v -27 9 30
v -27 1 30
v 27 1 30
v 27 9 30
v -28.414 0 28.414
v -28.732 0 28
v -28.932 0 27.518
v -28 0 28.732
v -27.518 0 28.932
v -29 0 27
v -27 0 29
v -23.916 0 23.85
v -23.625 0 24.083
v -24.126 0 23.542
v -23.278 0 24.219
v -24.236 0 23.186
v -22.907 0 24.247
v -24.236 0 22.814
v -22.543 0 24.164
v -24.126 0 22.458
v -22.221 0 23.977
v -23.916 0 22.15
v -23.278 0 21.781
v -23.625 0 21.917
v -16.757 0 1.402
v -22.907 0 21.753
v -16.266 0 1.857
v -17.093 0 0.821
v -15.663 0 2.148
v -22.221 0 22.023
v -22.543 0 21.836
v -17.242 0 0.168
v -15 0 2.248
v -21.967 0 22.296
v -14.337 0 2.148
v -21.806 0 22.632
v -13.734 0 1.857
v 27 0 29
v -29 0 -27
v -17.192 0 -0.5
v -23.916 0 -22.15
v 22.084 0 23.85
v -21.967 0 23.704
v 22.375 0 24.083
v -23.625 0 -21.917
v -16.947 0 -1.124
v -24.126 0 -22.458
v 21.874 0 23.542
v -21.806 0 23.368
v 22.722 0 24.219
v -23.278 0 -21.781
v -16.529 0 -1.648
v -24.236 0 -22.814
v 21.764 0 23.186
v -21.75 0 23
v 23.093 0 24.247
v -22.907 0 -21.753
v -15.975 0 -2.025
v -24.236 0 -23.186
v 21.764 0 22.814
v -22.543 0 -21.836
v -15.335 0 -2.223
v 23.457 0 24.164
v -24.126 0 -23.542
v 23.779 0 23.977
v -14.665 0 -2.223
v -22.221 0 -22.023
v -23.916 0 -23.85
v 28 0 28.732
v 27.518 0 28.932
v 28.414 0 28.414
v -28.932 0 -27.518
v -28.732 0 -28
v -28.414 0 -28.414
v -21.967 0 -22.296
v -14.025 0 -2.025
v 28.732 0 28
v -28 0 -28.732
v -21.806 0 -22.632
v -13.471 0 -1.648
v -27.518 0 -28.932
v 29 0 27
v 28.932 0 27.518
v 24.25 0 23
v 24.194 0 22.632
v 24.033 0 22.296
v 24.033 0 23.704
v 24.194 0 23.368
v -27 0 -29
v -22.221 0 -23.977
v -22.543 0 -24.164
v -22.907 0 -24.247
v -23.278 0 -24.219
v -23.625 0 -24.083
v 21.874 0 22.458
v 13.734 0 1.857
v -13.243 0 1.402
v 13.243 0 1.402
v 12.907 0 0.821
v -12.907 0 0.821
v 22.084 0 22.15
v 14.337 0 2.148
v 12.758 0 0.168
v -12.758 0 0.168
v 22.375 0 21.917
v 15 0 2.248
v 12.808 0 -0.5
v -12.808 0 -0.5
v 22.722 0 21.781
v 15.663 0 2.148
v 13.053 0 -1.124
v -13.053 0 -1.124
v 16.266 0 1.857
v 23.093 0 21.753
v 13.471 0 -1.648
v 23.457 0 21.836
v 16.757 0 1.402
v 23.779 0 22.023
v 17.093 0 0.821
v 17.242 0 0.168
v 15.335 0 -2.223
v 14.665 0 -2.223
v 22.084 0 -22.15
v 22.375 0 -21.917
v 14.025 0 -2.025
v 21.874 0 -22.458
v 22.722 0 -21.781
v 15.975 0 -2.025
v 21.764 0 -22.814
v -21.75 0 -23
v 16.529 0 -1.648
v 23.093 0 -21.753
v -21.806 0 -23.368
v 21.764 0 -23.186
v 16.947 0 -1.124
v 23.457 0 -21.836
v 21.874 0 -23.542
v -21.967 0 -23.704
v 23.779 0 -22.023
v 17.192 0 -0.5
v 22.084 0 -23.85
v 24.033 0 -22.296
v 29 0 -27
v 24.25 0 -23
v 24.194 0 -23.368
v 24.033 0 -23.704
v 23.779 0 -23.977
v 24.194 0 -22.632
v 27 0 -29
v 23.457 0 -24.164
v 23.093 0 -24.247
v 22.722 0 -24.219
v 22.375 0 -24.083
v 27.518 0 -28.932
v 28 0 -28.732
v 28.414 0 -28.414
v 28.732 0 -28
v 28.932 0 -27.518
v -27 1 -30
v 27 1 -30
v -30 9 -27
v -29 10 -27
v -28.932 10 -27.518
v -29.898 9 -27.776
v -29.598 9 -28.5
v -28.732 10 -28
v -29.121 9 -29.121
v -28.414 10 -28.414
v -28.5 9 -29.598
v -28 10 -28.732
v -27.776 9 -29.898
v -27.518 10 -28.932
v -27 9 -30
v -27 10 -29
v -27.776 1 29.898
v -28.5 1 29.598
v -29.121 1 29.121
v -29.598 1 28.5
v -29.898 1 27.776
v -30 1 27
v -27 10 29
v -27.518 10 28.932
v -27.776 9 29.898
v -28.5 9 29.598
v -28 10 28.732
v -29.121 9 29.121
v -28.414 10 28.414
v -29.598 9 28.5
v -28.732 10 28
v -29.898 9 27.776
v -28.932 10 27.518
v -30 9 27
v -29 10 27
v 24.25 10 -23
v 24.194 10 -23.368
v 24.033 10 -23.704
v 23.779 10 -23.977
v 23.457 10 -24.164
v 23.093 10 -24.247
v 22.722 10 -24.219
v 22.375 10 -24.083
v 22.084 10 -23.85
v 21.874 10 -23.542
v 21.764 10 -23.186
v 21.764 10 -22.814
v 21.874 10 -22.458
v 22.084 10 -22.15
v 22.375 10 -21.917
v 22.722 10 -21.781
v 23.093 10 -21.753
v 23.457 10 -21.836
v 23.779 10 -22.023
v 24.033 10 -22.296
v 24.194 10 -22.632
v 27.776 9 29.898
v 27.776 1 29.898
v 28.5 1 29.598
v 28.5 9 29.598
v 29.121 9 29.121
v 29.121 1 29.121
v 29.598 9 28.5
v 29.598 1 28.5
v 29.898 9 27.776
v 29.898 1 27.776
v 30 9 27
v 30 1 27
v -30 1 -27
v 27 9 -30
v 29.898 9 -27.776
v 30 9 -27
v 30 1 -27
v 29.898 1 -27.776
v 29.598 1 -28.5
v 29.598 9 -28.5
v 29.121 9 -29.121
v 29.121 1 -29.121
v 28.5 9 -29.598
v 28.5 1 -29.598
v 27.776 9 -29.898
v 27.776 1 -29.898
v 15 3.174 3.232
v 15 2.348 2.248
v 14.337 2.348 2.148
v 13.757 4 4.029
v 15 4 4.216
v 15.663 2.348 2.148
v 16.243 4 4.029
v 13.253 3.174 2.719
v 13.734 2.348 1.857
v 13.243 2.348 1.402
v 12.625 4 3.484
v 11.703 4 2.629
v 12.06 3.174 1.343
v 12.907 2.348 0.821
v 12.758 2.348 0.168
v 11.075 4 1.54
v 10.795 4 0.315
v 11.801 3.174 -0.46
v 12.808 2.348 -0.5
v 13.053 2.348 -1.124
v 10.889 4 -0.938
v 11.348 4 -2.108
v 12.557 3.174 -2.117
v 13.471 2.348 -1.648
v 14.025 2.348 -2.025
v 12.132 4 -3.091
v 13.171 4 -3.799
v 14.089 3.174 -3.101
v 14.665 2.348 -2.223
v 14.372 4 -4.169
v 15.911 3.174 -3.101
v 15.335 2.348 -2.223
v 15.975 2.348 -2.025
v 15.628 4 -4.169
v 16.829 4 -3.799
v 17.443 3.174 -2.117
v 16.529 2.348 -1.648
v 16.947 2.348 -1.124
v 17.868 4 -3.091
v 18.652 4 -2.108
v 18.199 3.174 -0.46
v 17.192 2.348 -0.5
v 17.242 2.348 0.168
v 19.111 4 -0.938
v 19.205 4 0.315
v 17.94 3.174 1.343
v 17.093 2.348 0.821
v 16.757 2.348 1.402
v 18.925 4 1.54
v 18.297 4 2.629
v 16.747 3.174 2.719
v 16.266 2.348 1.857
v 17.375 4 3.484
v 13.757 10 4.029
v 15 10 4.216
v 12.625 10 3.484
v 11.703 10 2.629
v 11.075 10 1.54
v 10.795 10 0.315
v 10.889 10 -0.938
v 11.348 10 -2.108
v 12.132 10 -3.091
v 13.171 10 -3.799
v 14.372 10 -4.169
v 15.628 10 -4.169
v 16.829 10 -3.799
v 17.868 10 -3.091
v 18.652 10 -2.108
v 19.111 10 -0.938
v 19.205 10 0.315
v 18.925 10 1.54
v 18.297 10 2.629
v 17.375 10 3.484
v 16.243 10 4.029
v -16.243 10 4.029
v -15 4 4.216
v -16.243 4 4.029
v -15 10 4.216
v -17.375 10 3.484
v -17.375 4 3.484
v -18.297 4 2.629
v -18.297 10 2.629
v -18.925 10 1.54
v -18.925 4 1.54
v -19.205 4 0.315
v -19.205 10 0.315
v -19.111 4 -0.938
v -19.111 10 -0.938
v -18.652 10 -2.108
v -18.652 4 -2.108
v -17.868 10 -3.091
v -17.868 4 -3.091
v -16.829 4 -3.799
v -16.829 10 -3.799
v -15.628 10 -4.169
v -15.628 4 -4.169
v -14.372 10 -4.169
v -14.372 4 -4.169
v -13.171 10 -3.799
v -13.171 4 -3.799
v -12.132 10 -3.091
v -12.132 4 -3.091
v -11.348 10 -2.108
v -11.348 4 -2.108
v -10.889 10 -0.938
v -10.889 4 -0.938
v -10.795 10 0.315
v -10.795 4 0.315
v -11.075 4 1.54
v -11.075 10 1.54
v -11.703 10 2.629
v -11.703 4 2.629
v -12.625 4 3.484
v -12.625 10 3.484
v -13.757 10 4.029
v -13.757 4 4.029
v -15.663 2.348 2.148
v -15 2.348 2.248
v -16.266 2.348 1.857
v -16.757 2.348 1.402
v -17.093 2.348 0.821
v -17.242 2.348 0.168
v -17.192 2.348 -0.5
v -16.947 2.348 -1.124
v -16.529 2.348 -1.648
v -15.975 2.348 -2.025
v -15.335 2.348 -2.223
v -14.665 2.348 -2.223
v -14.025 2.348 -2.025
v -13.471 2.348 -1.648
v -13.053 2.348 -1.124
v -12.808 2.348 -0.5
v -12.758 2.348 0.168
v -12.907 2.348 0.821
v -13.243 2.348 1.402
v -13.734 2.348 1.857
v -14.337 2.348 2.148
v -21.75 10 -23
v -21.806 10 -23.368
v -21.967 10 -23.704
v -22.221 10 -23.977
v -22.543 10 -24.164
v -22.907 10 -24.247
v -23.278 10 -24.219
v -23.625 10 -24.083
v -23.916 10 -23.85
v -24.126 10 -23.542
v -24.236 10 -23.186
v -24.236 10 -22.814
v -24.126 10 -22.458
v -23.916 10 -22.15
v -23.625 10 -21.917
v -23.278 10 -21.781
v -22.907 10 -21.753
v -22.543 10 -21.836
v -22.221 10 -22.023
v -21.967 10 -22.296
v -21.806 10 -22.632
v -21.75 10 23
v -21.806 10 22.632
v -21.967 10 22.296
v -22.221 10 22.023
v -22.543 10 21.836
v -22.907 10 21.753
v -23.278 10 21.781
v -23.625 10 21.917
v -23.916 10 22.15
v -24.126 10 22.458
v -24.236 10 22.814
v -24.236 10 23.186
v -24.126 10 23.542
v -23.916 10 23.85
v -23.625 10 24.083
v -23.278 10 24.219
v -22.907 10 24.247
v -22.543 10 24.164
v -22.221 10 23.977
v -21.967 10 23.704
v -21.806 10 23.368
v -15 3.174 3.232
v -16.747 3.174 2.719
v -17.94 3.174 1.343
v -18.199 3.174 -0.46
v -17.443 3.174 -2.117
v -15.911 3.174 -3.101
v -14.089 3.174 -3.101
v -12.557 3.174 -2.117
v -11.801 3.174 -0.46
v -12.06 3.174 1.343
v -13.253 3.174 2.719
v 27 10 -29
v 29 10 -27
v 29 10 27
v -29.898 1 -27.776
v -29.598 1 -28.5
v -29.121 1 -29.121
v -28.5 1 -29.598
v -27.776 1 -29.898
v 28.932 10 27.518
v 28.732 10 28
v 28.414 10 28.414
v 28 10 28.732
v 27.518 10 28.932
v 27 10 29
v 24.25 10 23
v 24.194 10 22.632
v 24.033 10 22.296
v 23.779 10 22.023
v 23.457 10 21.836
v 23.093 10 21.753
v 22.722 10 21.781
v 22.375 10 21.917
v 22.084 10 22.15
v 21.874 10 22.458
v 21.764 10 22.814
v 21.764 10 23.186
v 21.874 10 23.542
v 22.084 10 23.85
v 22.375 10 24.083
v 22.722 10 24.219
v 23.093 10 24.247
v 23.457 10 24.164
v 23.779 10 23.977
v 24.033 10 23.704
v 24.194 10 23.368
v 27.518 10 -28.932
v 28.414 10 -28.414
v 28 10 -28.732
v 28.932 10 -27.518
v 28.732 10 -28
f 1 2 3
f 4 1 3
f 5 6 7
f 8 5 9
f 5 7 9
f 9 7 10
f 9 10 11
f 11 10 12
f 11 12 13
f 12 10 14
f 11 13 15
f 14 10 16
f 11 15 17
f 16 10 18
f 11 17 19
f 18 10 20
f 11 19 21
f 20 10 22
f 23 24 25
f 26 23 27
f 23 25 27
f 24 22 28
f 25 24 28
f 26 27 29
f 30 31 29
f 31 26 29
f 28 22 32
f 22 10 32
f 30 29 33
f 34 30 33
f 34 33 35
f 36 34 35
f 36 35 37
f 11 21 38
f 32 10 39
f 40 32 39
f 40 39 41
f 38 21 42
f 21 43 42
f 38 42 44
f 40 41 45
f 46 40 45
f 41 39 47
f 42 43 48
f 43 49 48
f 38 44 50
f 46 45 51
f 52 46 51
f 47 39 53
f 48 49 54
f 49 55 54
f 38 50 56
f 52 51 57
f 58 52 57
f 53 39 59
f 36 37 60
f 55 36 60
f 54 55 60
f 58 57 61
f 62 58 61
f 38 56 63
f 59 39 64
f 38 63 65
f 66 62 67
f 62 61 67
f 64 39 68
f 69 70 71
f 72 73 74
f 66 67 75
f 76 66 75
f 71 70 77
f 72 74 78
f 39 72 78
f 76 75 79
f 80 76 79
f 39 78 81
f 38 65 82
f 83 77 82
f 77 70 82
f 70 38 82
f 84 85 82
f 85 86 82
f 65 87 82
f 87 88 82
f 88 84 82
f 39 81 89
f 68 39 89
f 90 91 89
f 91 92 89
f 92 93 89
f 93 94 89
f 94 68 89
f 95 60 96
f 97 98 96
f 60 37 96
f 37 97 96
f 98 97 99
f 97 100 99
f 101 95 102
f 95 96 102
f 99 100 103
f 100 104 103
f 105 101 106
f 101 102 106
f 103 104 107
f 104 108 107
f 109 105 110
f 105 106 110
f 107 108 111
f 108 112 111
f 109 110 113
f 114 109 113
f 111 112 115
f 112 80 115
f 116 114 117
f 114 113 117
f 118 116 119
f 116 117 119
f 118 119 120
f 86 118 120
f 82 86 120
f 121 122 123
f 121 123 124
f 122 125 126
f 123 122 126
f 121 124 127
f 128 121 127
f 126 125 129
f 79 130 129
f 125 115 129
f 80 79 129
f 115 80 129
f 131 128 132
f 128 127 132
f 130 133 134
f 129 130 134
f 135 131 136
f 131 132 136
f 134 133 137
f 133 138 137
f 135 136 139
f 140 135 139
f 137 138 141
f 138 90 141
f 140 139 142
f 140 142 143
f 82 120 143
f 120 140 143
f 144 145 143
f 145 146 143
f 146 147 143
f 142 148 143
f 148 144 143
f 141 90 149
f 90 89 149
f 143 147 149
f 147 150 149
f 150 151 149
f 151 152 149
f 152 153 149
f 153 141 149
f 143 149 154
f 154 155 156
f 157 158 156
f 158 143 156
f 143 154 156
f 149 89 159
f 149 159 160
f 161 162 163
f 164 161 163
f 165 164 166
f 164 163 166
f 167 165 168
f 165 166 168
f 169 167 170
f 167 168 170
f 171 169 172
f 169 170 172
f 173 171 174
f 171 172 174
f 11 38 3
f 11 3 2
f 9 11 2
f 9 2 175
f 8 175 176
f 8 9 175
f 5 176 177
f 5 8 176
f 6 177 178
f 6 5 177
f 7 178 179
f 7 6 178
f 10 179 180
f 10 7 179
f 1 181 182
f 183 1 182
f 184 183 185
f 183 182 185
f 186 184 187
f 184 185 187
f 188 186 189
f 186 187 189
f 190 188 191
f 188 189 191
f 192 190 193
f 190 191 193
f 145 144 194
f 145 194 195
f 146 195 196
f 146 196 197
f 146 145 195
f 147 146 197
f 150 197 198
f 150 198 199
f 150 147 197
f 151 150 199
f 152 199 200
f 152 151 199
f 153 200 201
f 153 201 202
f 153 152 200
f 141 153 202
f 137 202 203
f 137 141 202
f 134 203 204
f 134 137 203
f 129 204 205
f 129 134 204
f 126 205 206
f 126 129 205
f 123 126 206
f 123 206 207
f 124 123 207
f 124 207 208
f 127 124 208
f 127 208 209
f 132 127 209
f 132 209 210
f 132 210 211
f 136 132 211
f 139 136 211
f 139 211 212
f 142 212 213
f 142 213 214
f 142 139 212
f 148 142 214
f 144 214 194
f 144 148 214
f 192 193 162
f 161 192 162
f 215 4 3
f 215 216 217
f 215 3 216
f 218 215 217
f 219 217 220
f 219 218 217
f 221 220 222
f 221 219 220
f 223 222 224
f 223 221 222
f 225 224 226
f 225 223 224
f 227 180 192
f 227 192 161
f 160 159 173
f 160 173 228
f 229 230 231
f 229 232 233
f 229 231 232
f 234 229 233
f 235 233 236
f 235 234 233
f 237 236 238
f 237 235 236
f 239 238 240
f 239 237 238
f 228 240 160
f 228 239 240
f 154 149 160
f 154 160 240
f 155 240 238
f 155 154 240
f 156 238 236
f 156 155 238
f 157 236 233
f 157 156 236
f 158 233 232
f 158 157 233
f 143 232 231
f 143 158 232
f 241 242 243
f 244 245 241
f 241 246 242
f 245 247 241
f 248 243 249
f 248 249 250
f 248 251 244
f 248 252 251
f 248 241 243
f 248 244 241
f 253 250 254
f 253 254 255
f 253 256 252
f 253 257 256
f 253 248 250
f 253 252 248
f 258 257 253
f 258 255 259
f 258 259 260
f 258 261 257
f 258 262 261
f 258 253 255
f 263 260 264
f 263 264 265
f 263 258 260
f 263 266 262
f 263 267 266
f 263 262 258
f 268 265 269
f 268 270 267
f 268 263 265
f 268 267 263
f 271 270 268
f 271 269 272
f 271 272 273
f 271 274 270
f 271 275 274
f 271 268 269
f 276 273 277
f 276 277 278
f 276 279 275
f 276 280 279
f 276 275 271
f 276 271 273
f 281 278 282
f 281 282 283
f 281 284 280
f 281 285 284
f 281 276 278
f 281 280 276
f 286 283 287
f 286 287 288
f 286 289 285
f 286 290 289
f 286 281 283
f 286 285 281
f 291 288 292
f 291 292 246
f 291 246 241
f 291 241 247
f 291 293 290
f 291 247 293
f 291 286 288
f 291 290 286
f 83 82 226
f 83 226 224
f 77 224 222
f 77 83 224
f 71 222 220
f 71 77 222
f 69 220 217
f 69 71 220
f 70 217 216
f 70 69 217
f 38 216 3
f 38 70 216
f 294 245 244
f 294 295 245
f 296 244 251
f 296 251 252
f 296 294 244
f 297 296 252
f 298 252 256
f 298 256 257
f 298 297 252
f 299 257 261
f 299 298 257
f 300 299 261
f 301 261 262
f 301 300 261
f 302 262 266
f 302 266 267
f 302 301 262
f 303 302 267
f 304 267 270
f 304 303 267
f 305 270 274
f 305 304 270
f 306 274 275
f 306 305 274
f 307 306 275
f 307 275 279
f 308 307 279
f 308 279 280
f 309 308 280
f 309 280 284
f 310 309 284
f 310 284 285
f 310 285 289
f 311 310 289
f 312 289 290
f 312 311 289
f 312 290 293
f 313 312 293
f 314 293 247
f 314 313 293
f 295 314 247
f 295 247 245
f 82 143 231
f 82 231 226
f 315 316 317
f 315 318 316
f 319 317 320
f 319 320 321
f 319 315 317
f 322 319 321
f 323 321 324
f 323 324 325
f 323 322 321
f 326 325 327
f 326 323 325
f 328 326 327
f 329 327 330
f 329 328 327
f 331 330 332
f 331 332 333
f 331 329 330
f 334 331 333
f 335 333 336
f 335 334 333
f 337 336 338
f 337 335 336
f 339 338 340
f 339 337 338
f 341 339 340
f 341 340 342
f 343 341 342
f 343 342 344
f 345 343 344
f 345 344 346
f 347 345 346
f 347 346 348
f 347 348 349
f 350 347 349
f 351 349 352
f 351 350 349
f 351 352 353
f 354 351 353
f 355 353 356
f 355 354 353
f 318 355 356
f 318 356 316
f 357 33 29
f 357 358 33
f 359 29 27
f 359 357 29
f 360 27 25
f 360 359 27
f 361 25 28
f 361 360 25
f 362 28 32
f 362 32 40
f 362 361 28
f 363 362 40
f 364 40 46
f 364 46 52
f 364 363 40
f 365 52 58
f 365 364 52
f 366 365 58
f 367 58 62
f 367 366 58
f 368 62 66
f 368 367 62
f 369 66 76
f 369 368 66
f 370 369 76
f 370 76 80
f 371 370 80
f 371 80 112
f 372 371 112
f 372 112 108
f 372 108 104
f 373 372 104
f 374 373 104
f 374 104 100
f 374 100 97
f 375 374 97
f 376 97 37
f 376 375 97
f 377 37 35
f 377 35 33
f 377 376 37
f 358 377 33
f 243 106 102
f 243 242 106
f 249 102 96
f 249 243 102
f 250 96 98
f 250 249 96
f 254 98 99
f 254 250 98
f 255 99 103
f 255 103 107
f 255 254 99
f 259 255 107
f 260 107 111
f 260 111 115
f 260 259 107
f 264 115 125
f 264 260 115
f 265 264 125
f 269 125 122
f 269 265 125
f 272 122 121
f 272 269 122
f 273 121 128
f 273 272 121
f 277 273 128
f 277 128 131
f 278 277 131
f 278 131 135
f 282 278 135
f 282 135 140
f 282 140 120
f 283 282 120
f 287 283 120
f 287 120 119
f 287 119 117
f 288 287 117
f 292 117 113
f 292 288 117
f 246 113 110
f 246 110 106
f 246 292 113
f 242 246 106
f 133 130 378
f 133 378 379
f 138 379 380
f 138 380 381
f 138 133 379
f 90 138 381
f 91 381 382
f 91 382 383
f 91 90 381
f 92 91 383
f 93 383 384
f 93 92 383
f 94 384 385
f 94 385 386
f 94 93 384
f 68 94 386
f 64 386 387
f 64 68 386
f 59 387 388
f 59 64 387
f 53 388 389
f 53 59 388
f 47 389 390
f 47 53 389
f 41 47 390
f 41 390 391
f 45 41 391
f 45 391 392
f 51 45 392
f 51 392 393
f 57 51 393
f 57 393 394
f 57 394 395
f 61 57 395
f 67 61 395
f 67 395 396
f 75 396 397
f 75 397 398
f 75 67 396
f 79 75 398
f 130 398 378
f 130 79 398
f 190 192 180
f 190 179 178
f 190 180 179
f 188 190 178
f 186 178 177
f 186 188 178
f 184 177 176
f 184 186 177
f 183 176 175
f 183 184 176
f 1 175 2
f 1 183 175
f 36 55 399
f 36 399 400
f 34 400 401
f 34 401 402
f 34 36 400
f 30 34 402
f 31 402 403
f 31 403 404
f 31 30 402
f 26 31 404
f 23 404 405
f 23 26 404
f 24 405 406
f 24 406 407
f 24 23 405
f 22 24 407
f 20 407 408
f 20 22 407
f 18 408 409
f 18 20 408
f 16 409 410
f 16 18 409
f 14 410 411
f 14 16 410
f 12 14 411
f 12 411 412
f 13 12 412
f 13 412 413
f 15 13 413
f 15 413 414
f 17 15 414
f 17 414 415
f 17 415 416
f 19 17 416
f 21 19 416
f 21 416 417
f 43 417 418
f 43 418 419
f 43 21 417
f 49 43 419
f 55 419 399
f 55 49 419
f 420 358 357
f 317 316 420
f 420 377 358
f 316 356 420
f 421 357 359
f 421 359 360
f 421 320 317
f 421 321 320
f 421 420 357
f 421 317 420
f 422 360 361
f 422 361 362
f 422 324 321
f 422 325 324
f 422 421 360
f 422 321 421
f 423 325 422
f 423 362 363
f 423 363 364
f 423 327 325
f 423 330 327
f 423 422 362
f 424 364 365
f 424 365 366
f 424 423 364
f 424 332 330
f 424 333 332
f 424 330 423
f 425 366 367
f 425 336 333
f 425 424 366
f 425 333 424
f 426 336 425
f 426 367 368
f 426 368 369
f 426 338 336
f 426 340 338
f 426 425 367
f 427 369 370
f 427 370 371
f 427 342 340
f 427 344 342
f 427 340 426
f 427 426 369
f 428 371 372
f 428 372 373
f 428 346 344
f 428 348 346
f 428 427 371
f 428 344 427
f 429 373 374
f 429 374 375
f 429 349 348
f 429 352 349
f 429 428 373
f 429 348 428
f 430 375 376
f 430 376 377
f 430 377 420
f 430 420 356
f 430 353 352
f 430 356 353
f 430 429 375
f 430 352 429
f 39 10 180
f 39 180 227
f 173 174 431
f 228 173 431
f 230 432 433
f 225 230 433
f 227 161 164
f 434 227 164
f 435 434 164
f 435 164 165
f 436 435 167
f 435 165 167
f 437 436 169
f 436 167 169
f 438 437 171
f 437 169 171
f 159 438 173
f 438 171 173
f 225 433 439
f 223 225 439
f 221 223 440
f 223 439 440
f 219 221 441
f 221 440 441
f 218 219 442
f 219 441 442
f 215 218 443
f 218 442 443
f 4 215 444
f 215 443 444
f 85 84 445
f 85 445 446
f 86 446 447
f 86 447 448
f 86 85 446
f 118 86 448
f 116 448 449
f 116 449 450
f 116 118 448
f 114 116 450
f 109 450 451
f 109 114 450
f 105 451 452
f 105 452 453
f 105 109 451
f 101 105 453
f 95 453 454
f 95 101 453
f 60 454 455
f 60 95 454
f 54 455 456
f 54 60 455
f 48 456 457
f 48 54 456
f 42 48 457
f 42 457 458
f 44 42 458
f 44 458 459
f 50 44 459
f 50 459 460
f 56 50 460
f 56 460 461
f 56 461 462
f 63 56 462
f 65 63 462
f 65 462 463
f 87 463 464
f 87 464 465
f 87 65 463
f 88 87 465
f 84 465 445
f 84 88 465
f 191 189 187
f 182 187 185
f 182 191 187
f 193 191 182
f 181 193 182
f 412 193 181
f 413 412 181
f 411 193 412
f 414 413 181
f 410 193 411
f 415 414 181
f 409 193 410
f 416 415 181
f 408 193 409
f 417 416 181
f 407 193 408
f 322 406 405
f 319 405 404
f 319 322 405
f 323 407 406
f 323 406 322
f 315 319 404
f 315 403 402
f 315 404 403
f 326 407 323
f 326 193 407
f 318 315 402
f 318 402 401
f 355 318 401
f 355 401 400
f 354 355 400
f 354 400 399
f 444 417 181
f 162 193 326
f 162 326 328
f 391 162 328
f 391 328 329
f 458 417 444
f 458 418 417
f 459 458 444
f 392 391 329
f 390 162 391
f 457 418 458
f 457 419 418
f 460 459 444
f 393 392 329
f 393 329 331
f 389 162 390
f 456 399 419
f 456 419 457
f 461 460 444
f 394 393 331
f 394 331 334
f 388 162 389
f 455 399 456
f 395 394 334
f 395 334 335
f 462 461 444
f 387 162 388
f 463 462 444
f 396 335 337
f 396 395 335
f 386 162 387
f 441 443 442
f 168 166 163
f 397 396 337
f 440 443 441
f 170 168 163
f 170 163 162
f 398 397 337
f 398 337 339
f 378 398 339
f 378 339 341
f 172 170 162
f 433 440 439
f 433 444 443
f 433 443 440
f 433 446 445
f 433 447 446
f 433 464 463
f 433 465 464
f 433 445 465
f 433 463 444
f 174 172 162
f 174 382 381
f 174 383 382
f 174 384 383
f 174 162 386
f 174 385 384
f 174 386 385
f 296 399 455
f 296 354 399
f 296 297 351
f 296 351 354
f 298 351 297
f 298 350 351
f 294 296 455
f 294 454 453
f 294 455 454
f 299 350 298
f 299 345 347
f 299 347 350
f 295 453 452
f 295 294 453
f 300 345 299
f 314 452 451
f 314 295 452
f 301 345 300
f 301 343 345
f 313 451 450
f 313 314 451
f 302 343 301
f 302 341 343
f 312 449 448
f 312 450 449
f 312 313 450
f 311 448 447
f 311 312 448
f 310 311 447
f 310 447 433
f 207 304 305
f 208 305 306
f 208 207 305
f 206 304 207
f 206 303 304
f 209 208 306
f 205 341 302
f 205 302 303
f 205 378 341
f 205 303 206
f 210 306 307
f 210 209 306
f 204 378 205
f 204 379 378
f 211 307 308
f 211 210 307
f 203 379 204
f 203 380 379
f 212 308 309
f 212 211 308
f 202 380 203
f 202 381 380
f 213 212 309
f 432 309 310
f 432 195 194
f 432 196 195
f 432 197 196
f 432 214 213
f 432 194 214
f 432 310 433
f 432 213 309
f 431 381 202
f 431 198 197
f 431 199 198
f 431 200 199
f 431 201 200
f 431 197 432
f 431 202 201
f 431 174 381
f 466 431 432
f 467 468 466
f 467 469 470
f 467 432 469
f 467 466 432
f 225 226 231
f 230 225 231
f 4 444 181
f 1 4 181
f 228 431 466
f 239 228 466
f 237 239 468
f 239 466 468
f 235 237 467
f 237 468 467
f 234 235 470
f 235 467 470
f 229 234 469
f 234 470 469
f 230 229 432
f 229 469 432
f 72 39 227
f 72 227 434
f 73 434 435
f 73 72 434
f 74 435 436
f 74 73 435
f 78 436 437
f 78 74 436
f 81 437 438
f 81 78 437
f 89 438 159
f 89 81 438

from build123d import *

# Parameters (mm, degrees)
SKETCH1_W                                 = 60
SKETCH1_H                                 = 60
BOSS_EXTRUDE1_DEPTH                       = 10
FILLET1_R                                 = 3
M3X0_5_TAPPED_HOLE1_OUTLINE_R             = 1.25
M3X0_5_TAPPED_HOLE1_DEPTH                 = 10
CSK_FOR_8_FLAT_HEAD_MACHINE_SCREW_2_COUNT = 2
CSK_FOR_8_FLAT_HEAD_MACHINE_SCREW_2_PITCH = 30
CHAMFER1_SIZE                             = 1


# Read off the part's stored shape, not the designer's step: M3x0.5 Tapped Hole1
with BuildPart() as part:
    # Sketch1 → Boss-Extrude1 (new body)
    with BuildSketch(Plane(origin=(0, 0, 0), x_dir=(1, 0, 0), z_dir=(0, 1, 0))):
        Rectangle(SKETCH1_W, SKETCH1_H)
    extrude(amount=BOSS_EXTRUDE1_DEPTH)

    # Fillet1
    fillet1_edges = [part.edges().sort_by_distance(p)[0] for p in [
        (30, 5, 30),
        (-30, 5, 30),
        (-30, 5, -30),
        (30, 5, -30),
    ]]
    fillet(fillet1_edges, radius=FILLET1_R)

    # M3x0.5 Tapped Hole1 outline → M3x0.5 Tapped Hole1 (cut)
    with BuildSketch(Plane(origin=(0, 0, 0), x_dir=(1, 0, 0), z_dir=(0, 1, 0))):
        with Locations((23, -23)):
            Circle(M3X0_5_TAPPED_HOLE1_OUTLINE_R)
        with Locations((-23, 23)):
            Circle(M3X0_5_TAPPED_HOLE1_OUTLINE_R)
        with Locations((-23, -23)):
            Circle(M3X0_5_TAPPED_HOLE1_OUTLINE_R)
        with Locations((23, 23)):
            Circle(M3X0_5_TAPPED_HOLE1_OUTLINE_R)
    extrude(amount=M3X0_5_TAPPED_HOLE1_DEPTH, mode=Mode.SUBTRACT)

    # Sketch7 → CSK for #8 Flat Head Machine Screw (100)2 (revolve, cut)
    with BuildSketch(Plane(origin=(15, 10, 0), x_dir=(0, 0, 1), z_dir=(1, 0, 0))):
        Polygon((0, 0), (0, 10), (2.2479, 10), (2.2479, 7.651767624), (4.2164, 6), (4.2164, 0), align=None)
    csk_for_8_flat_head_machine_screw_100 = revolve(axis=Axis((15, 16.35, 0), (0, -1, 0)), mode=Mode.SUBTRACT)

    # CSK for _8 Flat Head Machine Screw _ 2: CSK for #8 Flat Head Machine Screw (100)2 ×2
    with Locations(*[(-i * CSK_FOR_8_FLAT_HEAD_MACHINE_SCREW_2_PITCH, 0, 0) for i in range(1, CSK_FOR_8_FLAT_HEAD_MACHINE_SCREW_2_COUNT)]):
        add(csk_for_8_flat_head_machine_screw_100, mode=Mode.SUBTRACT)

    # Chamfer1
    chamfer1_edges = [part.edges().sort_by_distance(p)[0] for p in [
        (-30, 0, 0),
        (-30, 10, 0),
        (30, 0, 0),
        (0, 0, 30),
        (0, 0, -30),
        (-29.121320344, 0, 29.121320344),
        (29.121320344, 0, 29.121320344),
        (29.121320344, 0, -29.121320344),
        (-29.121320344, 0, -29.121320344),
        (0, 10, -30),
        (30, 10, 0),
        (0, 10, 30),
        (-29.121320344, 10, 29.121320344),
        (29.121320344, 10, 29.121320344),
        (29.121320344, 10, -29.121320344),
        (-29.121320344, 10, -29.121320344),
    ]]
    chamfer(chamfer1_edges, length=CHAMFER1_SIZE)


solid = part.part
